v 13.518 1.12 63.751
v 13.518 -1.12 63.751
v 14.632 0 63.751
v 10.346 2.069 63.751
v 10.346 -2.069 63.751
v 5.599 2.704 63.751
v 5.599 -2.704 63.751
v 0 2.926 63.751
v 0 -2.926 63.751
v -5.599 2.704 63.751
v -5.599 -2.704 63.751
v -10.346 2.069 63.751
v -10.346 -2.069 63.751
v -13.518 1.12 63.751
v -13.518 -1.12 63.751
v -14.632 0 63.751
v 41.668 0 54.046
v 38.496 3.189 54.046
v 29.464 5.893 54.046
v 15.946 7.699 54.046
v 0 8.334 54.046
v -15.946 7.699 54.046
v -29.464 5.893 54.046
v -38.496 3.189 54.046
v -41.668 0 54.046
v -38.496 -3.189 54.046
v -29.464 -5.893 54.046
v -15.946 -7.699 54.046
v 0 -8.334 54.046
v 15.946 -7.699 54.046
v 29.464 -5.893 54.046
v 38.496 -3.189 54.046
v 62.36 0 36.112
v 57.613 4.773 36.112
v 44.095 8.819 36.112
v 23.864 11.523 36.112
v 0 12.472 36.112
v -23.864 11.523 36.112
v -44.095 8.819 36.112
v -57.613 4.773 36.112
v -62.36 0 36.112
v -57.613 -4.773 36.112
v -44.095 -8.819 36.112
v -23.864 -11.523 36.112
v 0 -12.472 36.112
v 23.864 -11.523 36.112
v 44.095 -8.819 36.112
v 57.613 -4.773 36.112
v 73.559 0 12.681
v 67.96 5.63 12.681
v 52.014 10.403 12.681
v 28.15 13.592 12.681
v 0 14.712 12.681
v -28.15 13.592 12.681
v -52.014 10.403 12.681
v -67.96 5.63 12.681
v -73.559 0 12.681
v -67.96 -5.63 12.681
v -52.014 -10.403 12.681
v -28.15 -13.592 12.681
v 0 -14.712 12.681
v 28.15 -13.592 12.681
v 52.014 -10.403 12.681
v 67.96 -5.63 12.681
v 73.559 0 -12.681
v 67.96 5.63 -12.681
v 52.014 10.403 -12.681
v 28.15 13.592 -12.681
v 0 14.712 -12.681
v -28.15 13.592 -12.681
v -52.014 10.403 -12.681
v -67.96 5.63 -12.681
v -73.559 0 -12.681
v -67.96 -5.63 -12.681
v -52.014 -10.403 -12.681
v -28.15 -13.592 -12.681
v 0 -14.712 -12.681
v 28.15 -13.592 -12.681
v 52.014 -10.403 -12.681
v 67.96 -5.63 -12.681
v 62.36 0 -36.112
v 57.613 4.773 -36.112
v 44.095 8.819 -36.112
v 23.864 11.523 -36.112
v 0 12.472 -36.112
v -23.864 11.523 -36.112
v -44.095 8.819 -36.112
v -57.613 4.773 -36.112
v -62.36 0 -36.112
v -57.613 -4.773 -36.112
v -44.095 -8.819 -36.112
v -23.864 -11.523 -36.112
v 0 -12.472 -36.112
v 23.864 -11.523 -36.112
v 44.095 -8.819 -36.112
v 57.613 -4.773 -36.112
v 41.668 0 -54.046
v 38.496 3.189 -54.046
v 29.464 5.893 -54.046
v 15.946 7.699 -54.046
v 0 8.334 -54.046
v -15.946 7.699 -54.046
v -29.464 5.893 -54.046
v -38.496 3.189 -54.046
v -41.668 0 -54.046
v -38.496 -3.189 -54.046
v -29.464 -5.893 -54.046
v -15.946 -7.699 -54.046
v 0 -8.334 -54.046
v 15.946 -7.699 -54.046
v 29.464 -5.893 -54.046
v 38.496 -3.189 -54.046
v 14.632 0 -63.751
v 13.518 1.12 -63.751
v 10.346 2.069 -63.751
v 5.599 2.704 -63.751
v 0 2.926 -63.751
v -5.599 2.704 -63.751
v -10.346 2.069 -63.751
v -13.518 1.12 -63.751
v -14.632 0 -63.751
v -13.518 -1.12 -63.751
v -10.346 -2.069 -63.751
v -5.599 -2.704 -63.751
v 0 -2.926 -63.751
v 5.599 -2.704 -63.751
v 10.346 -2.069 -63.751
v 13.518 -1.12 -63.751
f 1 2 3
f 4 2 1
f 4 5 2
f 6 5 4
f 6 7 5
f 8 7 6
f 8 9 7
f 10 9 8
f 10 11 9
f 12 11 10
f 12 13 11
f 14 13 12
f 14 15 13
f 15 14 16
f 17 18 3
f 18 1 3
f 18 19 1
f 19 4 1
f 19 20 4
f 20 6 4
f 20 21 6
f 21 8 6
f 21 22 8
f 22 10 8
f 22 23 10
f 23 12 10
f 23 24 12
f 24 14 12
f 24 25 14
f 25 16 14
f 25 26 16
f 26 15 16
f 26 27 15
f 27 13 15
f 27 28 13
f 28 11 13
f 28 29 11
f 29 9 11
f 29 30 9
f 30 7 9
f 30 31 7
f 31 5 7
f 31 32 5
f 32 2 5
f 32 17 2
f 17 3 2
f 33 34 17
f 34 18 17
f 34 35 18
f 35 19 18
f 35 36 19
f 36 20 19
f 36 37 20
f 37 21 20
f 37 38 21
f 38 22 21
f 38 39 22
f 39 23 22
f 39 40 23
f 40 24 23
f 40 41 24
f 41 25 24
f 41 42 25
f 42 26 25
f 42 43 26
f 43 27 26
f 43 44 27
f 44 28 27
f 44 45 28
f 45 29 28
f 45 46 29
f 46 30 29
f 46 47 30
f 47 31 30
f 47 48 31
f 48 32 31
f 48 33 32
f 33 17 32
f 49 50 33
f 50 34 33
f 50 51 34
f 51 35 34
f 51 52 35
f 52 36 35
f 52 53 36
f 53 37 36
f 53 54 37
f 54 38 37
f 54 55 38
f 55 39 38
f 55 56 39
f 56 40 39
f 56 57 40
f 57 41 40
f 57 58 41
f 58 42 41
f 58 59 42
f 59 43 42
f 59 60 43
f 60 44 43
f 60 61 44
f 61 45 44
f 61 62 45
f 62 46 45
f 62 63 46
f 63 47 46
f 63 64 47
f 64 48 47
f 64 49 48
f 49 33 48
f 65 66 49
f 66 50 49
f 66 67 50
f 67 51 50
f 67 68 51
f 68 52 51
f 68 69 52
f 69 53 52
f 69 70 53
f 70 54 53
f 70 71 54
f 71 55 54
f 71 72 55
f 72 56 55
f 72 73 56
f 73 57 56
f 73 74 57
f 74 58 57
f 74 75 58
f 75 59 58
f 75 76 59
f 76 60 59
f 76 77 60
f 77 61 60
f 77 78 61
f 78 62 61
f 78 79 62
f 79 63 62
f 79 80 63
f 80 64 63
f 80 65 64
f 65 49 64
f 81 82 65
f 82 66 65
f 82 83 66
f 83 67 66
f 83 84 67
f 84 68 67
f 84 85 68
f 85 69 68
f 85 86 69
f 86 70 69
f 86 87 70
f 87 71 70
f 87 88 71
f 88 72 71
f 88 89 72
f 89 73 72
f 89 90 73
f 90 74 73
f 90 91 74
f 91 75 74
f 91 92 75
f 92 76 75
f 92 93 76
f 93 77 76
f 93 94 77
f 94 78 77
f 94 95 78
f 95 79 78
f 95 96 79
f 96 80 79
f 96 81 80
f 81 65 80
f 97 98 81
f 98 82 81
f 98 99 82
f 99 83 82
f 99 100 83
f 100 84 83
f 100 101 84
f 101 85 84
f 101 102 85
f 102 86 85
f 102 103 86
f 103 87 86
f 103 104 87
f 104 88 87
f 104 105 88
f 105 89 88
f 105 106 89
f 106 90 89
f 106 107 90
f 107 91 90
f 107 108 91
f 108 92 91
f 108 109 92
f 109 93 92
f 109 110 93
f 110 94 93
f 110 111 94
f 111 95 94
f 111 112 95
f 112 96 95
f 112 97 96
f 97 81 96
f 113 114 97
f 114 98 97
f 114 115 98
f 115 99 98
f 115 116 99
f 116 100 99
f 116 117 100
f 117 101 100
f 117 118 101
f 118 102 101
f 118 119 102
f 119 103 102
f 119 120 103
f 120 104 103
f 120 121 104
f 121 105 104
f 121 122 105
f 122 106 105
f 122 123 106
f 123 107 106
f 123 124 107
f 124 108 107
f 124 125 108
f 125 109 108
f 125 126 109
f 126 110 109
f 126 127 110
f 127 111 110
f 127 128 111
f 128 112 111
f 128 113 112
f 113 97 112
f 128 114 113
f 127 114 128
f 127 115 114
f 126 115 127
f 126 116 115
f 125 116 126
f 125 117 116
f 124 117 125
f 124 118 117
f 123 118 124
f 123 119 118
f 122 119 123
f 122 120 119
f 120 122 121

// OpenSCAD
// Generated by SolidPython 1.0.1 on 2020-07-29 00:46:51


scale(v = [15, 3, 13]) {
	sphere(r = 5);
}
/***********************************************
*********      SolidPython code:      **********
************************************************
 
# import packages: SolidPython
from solid import *
from solid.utils import *
from itertools import chain, combinations, permutations


class Resize:

    def __init__(self, scad_file):
        self.scad_file = scad_file
        #self.scad_file = import_scad(scad_file)
        # cone/cylinder param:
        self.r1 = 0
        self.r2 = 0
        self.h = 0
        # rectangular prism param:
        self.w = 0
        self.l = 0
        # ellipse param:
        self.r = 0

    # import OpenScad code (file name corresponds to shape)


    # classify shape + parameters
    def assign(self, param1, param2, param3):
        if self.scad_file == 'cone.scad':
            self.r1 = param1
            self.r2 = param2
            self.h = param3
        elif self.scad_file == 'cylinder.scad':
            self.r1 = param1
            self.r2 = param2
            self.h = param3
        elif self.scad_file == 'rectangularPrism.scad':
            self.h = param1
            self.l = param2
            self.w = param3
        else:
            self.r = param1
            self.h = param2

    # resize parameters
    def iterate(self):
        x = range(3, 20, 2)
        i = 1
        if self.scad_file == 'cone.scad':
            tempList = list(permutations(x, 2))
            for temp in tempList:
                param1 = temp[0]
                param2 = temp[1]
                filepath = 'produced_scad_files/' + 'cone' + str(param1) + '_' + str(param2) + '_' + '.scad'
                scad_render_to_file(cylinder(h=param1, r1=param2, r2=0), filepath)

        elif self.scad_file == 'cylinder.scad':
            tempList = list(permutations(x, 3))
            for temp in tempList:
                param1 = temp[0]
                param2 = temp[1]
                filepath = 'produced_scad_files/' + 'cylinder' + str(param1) + '_' + str(param2) + '_' + '.scad'
                scad_render_to_file(cylinder(h=param1, r1=param2, r2=param2), filepath)

        elif self.scad_file == 'rectangularPrism.scad':
            tempList = list(permutations(x, 3))
            for temp in tempList:
                param1 = temp[0]
                param2 = temp[1]
                param3 = temp[2]
                filepath = 'produced_scad_files/' + 'rectangularPrism' + str(param1) + '_' + str(param2) + '_' + str(
                    param3) + '.scad'
                scad_render_to_file(cube(size=(param1, param2, param3)), filepath)

        elif self.scad_file == 'ellipse.scad':
            tempList = list(permutations(x, 4))
            for temp in tempList:
                param1 = temp[0]
                param2 = temp[1]
                param3 = temp[2]
                param4 = temp[3]
                filepath = 'produced_scad_files/' + 'ellipse' + str(param1) + '_' + str(param2) + '_' + str(param3) + '_' + str(param4) + '.scad'
                scad_render_to_file(scale([param1, param2, param3])(sphere(r=param4)), filepath)

    def render_to_scadfile(self):
        scad_render_to_file(scad, 'example.scad') 
 
************************************************/
